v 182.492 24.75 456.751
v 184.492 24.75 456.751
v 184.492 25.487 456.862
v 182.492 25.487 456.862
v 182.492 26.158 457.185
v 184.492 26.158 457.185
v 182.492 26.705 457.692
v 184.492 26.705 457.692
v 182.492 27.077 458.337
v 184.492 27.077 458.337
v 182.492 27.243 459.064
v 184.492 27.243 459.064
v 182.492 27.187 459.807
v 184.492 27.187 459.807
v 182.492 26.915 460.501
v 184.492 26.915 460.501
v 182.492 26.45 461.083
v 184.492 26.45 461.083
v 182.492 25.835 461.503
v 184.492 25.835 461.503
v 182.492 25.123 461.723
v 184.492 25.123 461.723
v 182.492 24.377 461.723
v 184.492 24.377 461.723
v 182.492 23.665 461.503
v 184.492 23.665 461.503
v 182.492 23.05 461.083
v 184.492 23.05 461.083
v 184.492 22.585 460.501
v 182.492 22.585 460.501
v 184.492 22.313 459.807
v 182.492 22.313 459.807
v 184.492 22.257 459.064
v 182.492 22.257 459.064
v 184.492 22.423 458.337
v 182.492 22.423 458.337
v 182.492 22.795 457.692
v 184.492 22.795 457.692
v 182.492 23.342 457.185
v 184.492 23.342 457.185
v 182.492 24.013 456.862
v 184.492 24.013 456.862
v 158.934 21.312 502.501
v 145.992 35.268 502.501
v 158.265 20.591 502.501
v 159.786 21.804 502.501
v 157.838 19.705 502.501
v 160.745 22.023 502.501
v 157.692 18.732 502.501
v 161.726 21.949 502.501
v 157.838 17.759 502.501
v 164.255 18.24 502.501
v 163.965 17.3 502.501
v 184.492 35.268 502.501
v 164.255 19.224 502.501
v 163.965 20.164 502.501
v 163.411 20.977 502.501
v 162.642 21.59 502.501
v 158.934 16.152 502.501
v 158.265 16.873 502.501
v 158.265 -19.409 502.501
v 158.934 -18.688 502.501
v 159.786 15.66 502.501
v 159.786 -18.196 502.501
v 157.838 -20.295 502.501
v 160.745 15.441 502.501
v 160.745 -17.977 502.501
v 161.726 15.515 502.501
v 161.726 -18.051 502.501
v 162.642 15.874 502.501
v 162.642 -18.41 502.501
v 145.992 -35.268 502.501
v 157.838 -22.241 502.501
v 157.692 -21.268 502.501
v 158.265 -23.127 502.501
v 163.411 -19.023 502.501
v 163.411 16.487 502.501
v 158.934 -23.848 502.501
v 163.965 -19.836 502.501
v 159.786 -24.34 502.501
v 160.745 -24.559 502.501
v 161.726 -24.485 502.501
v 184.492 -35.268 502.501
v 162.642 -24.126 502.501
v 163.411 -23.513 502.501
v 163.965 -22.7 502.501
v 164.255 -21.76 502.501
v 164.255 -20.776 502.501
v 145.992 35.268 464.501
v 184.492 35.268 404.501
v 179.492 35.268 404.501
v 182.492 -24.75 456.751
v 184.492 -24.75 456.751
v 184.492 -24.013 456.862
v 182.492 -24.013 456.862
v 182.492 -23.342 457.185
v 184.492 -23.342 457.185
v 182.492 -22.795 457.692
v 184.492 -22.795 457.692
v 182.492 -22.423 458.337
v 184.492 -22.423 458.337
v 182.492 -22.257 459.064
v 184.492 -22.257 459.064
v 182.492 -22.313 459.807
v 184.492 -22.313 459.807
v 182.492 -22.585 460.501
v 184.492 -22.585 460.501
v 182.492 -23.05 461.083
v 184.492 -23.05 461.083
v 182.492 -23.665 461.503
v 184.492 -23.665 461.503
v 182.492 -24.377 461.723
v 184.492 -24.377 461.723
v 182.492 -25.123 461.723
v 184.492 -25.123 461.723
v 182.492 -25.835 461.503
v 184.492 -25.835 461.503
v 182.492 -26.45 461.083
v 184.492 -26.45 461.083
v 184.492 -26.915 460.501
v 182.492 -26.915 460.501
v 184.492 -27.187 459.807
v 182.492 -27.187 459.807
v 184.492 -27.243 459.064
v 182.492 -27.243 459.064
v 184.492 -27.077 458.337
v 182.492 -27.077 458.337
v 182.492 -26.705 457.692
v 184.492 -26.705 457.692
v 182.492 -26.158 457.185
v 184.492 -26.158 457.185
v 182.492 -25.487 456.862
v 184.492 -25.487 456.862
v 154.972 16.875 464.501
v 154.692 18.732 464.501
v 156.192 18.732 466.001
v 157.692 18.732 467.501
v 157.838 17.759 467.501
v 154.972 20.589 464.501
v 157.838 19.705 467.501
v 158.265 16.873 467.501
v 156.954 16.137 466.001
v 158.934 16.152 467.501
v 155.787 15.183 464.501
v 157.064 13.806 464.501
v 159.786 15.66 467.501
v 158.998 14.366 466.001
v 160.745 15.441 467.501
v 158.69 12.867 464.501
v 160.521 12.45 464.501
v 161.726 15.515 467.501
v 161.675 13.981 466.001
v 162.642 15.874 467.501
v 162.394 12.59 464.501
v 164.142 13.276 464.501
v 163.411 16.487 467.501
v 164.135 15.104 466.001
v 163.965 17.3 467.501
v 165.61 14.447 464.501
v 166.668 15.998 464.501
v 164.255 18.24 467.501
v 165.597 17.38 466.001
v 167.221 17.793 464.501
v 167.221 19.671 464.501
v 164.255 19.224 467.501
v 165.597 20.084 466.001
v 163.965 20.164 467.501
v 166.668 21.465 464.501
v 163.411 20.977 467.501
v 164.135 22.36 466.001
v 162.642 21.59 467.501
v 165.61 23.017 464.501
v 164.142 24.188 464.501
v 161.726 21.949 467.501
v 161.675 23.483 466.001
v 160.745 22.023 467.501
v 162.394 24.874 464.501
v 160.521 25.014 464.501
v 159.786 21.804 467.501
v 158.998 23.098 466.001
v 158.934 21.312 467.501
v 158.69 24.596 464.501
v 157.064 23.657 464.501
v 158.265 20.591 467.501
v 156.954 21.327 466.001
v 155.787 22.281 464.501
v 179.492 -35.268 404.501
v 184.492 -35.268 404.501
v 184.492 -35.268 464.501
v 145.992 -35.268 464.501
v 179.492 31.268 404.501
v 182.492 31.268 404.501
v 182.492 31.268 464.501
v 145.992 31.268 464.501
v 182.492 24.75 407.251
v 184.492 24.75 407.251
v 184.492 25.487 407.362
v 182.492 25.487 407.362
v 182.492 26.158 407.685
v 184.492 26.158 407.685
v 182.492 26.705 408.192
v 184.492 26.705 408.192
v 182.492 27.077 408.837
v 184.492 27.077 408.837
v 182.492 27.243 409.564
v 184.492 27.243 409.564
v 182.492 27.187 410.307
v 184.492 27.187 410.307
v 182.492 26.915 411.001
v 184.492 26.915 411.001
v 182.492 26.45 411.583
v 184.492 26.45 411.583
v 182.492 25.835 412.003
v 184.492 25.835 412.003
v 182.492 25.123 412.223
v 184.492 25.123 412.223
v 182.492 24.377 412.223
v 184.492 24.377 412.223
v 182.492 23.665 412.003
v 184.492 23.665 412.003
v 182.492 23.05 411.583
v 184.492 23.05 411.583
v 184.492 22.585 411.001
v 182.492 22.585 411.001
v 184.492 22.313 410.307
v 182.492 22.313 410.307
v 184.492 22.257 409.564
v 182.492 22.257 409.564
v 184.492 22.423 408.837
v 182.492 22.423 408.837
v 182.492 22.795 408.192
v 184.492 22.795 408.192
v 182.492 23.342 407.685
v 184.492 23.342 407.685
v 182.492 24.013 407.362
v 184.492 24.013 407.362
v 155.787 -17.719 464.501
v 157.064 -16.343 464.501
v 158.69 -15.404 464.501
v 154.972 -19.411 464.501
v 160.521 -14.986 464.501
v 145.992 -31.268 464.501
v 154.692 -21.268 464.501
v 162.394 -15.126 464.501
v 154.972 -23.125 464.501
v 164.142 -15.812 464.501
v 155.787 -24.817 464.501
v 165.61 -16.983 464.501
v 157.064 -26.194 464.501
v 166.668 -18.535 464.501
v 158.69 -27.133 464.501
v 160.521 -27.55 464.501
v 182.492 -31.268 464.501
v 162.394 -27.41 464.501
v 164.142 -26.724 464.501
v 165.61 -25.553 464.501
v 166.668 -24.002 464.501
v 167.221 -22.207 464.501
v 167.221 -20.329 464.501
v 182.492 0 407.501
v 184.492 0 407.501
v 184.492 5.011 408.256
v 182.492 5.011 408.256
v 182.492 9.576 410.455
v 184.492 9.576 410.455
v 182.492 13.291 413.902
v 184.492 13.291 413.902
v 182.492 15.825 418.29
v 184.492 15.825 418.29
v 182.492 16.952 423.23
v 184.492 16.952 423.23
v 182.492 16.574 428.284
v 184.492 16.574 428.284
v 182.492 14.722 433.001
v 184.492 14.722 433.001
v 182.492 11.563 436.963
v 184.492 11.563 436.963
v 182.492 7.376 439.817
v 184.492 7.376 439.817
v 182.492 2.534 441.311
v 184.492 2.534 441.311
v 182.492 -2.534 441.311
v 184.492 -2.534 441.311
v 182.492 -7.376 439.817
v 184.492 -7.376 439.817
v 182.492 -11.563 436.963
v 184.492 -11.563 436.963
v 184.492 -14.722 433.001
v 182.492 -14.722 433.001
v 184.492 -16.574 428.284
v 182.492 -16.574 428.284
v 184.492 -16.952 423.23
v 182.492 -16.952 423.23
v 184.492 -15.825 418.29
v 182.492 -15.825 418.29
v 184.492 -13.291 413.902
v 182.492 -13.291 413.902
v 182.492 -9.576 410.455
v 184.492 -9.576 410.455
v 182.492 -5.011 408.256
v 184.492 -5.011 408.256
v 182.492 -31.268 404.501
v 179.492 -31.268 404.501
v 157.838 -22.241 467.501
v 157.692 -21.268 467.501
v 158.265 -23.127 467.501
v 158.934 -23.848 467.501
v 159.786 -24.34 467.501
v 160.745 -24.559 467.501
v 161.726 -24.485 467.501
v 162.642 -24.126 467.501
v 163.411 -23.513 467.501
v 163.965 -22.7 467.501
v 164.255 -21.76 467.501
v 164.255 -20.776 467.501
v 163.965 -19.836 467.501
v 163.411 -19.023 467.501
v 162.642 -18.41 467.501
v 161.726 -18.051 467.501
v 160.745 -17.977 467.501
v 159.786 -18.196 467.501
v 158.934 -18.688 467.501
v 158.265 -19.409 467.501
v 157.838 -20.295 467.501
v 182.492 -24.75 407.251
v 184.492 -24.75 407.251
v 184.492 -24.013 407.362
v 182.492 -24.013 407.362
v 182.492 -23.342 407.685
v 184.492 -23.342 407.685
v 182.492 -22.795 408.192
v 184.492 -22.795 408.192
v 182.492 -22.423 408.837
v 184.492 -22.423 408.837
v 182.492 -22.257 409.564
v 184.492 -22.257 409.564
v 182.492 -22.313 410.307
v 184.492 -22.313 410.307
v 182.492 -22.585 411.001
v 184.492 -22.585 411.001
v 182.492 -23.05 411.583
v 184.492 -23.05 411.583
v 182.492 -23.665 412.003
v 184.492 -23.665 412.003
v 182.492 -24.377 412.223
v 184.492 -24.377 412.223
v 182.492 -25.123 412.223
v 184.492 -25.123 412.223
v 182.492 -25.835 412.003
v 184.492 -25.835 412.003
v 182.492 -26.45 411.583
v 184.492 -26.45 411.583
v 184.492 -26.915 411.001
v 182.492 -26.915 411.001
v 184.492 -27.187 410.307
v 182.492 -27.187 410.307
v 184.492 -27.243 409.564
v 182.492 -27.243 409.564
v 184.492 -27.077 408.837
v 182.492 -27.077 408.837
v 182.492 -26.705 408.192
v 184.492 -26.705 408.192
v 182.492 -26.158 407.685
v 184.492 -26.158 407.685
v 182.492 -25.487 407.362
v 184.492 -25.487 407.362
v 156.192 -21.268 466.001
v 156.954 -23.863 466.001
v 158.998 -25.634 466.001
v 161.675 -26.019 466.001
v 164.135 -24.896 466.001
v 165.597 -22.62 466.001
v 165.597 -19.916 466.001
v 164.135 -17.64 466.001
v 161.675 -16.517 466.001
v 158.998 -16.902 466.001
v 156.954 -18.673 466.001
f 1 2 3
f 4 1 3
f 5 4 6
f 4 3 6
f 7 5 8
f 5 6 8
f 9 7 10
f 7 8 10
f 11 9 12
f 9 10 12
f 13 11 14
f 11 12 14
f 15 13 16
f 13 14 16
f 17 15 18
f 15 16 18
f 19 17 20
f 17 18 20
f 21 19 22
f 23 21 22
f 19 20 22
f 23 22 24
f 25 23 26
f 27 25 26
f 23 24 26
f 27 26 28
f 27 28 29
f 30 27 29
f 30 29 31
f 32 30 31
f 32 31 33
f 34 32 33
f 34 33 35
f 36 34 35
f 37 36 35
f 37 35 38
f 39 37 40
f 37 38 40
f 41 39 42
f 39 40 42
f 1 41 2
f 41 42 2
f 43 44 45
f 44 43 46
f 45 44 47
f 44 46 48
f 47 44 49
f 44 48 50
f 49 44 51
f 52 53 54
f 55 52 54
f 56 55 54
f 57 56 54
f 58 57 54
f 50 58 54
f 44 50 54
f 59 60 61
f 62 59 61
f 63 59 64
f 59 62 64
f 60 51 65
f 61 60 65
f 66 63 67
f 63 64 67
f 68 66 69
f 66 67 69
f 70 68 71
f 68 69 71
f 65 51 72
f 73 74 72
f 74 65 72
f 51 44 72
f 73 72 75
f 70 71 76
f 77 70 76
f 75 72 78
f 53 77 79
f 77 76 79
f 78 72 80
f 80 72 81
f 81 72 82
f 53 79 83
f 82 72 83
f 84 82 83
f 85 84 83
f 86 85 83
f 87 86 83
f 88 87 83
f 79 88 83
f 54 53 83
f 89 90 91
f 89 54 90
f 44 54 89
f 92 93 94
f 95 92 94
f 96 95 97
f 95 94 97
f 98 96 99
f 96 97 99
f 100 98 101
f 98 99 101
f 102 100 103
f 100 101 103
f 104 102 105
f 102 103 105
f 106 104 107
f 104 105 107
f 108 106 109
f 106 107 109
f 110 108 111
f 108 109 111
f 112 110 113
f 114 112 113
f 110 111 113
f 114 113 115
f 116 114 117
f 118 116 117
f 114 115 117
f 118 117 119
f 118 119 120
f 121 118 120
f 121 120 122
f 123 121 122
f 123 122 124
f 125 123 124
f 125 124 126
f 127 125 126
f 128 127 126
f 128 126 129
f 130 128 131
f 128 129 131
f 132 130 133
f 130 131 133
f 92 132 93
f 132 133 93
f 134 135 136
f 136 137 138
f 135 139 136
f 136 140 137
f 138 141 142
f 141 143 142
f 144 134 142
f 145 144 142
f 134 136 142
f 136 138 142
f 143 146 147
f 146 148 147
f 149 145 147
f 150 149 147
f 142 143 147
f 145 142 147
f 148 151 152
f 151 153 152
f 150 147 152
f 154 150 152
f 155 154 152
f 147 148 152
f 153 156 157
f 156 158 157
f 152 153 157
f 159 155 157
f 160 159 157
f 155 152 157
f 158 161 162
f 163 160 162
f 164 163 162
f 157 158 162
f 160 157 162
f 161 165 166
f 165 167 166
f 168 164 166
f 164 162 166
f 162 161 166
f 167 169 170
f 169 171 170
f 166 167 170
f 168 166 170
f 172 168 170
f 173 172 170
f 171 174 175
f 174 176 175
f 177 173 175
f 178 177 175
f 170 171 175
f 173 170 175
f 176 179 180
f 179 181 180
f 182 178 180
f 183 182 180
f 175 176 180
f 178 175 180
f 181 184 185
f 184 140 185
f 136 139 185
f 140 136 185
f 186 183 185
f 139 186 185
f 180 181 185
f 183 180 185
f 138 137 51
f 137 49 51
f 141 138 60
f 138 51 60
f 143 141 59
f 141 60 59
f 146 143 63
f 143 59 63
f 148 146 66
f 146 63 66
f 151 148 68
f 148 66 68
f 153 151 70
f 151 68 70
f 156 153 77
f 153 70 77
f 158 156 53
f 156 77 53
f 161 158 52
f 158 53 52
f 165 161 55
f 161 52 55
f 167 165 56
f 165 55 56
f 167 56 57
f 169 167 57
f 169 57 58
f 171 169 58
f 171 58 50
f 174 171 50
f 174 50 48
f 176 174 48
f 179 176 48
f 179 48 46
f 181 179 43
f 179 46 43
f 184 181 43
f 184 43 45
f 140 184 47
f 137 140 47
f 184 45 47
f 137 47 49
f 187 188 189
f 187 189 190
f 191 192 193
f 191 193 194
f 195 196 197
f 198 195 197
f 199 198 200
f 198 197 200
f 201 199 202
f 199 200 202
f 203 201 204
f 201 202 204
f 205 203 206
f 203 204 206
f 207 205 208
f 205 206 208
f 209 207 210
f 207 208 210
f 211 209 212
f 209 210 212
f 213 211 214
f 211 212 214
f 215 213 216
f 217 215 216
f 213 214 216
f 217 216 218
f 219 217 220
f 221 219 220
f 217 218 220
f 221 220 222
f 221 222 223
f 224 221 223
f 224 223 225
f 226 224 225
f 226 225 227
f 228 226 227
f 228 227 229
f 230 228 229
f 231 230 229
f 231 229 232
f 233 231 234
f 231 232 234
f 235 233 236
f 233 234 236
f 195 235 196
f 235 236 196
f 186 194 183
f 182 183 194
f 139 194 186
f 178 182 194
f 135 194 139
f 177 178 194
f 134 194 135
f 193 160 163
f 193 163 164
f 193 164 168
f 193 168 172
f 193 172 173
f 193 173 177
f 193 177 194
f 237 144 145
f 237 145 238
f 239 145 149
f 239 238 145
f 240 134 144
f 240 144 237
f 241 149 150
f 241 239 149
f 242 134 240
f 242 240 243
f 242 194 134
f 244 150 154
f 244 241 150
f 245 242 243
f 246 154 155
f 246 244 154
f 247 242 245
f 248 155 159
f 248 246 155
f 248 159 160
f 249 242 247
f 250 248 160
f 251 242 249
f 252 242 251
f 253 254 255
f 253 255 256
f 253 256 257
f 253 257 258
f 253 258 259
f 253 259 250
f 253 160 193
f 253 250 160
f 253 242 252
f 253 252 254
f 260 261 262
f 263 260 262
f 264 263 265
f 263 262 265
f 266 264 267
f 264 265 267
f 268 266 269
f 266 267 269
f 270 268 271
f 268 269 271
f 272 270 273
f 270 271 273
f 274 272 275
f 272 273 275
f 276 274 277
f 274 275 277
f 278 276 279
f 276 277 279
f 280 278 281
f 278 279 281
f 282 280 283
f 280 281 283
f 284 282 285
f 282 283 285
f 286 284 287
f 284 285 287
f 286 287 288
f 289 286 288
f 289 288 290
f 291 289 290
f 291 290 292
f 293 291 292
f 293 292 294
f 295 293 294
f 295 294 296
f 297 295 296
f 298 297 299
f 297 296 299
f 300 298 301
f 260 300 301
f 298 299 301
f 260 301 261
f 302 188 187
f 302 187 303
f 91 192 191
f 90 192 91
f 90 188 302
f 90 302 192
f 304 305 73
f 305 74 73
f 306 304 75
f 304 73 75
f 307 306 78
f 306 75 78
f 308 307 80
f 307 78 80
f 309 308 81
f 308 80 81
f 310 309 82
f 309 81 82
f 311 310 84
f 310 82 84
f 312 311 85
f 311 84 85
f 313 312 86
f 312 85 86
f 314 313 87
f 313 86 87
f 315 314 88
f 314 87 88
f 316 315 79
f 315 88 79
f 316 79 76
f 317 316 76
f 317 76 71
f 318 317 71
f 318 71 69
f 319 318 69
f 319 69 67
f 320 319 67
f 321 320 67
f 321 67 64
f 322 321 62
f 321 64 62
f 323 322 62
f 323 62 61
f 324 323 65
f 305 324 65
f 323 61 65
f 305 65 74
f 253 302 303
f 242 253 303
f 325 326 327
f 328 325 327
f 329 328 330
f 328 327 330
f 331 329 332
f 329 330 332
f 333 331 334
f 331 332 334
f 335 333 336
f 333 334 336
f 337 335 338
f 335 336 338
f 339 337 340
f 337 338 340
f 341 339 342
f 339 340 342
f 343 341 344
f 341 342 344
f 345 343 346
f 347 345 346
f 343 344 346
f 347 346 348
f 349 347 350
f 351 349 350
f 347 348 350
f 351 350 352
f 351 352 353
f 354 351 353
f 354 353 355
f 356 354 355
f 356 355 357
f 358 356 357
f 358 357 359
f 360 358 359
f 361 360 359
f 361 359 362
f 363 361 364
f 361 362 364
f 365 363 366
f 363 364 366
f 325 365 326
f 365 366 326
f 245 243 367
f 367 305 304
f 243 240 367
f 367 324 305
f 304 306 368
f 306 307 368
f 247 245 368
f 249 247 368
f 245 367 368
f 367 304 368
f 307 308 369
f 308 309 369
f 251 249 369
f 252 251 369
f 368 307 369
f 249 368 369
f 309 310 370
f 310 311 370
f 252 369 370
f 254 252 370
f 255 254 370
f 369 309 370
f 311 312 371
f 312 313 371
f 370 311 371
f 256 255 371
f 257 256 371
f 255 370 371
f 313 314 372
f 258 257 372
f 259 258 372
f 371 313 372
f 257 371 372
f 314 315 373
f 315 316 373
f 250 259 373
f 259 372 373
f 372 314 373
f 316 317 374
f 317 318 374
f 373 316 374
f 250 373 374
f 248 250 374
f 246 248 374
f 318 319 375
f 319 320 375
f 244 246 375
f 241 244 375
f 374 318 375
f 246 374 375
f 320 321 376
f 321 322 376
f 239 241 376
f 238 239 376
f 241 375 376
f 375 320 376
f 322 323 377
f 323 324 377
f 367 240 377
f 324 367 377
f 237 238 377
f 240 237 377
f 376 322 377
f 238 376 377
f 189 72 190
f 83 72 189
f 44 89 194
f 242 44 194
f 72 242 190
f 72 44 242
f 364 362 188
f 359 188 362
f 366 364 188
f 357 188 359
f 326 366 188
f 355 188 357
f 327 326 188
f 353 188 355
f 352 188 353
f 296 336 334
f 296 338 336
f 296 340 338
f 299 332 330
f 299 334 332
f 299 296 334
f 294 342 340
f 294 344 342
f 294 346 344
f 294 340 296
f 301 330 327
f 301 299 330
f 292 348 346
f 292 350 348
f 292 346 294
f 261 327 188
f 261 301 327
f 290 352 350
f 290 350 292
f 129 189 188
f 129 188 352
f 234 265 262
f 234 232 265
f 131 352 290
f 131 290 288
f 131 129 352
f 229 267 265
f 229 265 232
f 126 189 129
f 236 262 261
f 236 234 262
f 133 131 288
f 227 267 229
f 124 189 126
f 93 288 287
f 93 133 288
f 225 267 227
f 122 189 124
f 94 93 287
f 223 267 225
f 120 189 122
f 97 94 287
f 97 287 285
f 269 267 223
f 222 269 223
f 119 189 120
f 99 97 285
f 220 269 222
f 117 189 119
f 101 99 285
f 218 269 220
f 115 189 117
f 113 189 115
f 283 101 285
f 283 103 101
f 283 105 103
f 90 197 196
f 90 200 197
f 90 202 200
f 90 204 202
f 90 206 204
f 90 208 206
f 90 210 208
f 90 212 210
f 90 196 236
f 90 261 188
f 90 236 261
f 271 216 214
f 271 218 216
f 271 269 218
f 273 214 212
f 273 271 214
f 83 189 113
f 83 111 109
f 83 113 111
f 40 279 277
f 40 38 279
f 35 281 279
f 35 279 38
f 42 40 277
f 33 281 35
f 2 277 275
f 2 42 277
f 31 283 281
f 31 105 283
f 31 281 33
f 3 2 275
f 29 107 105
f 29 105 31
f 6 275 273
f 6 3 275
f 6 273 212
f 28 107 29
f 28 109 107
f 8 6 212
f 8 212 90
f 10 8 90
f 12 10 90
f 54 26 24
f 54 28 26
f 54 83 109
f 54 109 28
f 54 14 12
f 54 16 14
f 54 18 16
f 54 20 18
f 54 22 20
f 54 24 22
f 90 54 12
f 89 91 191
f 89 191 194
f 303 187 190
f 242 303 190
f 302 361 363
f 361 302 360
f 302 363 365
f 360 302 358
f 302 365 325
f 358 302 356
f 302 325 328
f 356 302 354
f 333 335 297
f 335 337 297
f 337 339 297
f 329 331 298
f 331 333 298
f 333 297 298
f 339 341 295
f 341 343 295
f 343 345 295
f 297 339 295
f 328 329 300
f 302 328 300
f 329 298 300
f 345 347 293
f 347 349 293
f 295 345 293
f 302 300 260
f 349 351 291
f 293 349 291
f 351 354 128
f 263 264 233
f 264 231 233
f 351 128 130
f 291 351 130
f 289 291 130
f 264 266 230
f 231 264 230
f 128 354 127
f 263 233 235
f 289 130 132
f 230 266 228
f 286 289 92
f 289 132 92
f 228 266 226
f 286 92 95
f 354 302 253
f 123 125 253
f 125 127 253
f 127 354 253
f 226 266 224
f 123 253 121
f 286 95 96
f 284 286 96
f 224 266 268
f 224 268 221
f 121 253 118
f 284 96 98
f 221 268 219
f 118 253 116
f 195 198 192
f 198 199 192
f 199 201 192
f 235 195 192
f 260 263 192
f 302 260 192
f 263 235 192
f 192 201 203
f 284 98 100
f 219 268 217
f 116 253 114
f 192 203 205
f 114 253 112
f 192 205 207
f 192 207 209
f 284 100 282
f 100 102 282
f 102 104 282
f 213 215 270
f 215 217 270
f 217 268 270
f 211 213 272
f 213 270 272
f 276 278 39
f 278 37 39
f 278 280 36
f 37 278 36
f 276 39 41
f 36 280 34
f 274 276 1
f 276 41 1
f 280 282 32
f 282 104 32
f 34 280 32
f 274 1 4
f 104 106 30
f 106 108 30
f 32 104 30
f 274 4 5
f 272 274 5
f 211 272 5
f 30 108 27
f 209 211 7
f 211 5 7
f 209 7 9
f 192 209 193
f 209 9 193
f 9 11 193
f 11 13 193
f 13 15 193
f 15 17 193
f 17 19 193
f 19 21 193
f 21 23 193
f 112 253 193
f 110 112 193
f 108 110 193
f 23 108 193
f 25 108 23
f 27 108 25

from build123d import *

# Parameters (mm, degrees)
SKETCH1_W                                       = 38.5
SKETCH1_H                                       = 70.536099416
BOSS_EXTRUDE1_DEPTH                             = 38
BOSS_EXTRUDE2_DEPTH                             = 4
BOSS_EXTRUDE3_START                             = -70.536099
BOSS_EXTRUDE3_DEPTH                             = 4
SKETCH4_W                                       = 62.536099416
SKETCH4_H                                       = 60
SKETCH4_R                                       = 17
SKETCH4_R_2                                     = 2.5
BOSS_EXTRUDE4_DEPTH                             = 2
CSK_FOR_M6_FLAT_HEAD_MACHINE_SCREW1_D           = 6.6
CSK_FOR_M6_FLAT_HEAD_MACHINE_SCREW1_CSINK_D     = 12.6
CSK_FOR_M6_FLAT_HEAD_MACHINE_SCREW1_CSINK_ANGLE = 90


with BuildPart() as part:
    # Sketch1 → Boss-Extrude1 (new body)
    with BuildSketch(Plane(origin=(0, 0, 502.500831462), x_dir=(1, 0, 0), z_dir=(0, 0, -1))):
        with Locations((165.241839146, 0)):
            Rectangle(SKETCH1_W, SKETCH1_H)
    extrude(amount=BOSS_EXTRUDE1_DEPTH)

    # Sketch3 → Boss-Extrude2 (add)
    with BuildSketch(Plane(origin=(0, 35.268049708, 0), x_dir=(-1, 0, 0), z_dir=(0, 1, 0))):
        Polygon((-184.491839146, 404.500831462), (-179.491839146, 404.500831462), (-145.991839146, 464.500831462), (-184.491839146, 464.500831462), align=None)
    extrude(amount=-BOSS_EXTRUDE2_DEPTH)

    # Sketch3<2> → Boss-Extrude3 (add)
    with BuildSketch(Plane(origin=(0, 35.268049708, 0), x_dir=(-1, 0, 0), z_dir=(0, 1, 0)).offset(BOSS_EXTRUDE3_START)):
        Polygon((-184.491839146, 404.500831462), (-179.491839146, 404.500831462), (-145.991839146, 464.500831462), (-184.491839146, 464.500831462), align=None)
    extrude(amount=BOSS_EXTRUDE3_DEPTH)

    # Sketch4 → Boss-Extrude4 (add)
    with BuildSketch(Plane.YZ.offset(184.491839146)):
        with Locations((0, 434.500831462)):
            Rectangle(SKETCH4_W, SKETCH4_H)
        with Locations(Location((0, 424.500831462, 0), (0, 0, 270))):
            Circle(SKETCH4_R, mode=Mode.SUBTRACT)
        with Locations(Location((-24.75, 459.250831462, 0), (0, 0, 270))):
            Circle(SKETCH4_R_2, mode=Mode.SUBTRACT)
        with Locations(Location((24.75, 459.250831462, 0), (0, 0, 270))):
            Circle(SKETCH4_R_2, mode=Mode.SUBTRACT)
        with Locations(Location((24.75, 409.750831462, 0), (0, 0, 270))):
            Circle(SKETCH4_R_2, mode=Mode.SUBTRACT)
        with Locations(Location((-24.75, 409.750831462, 0), (0, 0, 270))):
            Circle(SKETCH4_R_2, mode=Mode.SUBTRACT)
    extrude(amount=-BOSS_EXTRUDE4_DEPTH)

    # CSK for M6 Flat Head Machine Screw1 (through all)
    with Locations(Plane(origin=(0, 0, 464.500831462), x_dir=(1, 0, 0), z_dir=(0, 0, -1))):
        with Locations((160.991839146, -18.731950292), (160.991839146, 21.268049708)):
            CounterSinkHole(CSK_FOR_M6_FLAT_HEAD_MACHINE_SCREW1_D / 2, CSK_FOR_M6_FLAT_HEAD_MACHINE_SCREW1_CSINK_D / 2, counter_sink_angle=CSK_FOR_M6_FLAT_HEAD_MACHINE_SCREW1_CSINK_ANGLE)


solid = part.part
